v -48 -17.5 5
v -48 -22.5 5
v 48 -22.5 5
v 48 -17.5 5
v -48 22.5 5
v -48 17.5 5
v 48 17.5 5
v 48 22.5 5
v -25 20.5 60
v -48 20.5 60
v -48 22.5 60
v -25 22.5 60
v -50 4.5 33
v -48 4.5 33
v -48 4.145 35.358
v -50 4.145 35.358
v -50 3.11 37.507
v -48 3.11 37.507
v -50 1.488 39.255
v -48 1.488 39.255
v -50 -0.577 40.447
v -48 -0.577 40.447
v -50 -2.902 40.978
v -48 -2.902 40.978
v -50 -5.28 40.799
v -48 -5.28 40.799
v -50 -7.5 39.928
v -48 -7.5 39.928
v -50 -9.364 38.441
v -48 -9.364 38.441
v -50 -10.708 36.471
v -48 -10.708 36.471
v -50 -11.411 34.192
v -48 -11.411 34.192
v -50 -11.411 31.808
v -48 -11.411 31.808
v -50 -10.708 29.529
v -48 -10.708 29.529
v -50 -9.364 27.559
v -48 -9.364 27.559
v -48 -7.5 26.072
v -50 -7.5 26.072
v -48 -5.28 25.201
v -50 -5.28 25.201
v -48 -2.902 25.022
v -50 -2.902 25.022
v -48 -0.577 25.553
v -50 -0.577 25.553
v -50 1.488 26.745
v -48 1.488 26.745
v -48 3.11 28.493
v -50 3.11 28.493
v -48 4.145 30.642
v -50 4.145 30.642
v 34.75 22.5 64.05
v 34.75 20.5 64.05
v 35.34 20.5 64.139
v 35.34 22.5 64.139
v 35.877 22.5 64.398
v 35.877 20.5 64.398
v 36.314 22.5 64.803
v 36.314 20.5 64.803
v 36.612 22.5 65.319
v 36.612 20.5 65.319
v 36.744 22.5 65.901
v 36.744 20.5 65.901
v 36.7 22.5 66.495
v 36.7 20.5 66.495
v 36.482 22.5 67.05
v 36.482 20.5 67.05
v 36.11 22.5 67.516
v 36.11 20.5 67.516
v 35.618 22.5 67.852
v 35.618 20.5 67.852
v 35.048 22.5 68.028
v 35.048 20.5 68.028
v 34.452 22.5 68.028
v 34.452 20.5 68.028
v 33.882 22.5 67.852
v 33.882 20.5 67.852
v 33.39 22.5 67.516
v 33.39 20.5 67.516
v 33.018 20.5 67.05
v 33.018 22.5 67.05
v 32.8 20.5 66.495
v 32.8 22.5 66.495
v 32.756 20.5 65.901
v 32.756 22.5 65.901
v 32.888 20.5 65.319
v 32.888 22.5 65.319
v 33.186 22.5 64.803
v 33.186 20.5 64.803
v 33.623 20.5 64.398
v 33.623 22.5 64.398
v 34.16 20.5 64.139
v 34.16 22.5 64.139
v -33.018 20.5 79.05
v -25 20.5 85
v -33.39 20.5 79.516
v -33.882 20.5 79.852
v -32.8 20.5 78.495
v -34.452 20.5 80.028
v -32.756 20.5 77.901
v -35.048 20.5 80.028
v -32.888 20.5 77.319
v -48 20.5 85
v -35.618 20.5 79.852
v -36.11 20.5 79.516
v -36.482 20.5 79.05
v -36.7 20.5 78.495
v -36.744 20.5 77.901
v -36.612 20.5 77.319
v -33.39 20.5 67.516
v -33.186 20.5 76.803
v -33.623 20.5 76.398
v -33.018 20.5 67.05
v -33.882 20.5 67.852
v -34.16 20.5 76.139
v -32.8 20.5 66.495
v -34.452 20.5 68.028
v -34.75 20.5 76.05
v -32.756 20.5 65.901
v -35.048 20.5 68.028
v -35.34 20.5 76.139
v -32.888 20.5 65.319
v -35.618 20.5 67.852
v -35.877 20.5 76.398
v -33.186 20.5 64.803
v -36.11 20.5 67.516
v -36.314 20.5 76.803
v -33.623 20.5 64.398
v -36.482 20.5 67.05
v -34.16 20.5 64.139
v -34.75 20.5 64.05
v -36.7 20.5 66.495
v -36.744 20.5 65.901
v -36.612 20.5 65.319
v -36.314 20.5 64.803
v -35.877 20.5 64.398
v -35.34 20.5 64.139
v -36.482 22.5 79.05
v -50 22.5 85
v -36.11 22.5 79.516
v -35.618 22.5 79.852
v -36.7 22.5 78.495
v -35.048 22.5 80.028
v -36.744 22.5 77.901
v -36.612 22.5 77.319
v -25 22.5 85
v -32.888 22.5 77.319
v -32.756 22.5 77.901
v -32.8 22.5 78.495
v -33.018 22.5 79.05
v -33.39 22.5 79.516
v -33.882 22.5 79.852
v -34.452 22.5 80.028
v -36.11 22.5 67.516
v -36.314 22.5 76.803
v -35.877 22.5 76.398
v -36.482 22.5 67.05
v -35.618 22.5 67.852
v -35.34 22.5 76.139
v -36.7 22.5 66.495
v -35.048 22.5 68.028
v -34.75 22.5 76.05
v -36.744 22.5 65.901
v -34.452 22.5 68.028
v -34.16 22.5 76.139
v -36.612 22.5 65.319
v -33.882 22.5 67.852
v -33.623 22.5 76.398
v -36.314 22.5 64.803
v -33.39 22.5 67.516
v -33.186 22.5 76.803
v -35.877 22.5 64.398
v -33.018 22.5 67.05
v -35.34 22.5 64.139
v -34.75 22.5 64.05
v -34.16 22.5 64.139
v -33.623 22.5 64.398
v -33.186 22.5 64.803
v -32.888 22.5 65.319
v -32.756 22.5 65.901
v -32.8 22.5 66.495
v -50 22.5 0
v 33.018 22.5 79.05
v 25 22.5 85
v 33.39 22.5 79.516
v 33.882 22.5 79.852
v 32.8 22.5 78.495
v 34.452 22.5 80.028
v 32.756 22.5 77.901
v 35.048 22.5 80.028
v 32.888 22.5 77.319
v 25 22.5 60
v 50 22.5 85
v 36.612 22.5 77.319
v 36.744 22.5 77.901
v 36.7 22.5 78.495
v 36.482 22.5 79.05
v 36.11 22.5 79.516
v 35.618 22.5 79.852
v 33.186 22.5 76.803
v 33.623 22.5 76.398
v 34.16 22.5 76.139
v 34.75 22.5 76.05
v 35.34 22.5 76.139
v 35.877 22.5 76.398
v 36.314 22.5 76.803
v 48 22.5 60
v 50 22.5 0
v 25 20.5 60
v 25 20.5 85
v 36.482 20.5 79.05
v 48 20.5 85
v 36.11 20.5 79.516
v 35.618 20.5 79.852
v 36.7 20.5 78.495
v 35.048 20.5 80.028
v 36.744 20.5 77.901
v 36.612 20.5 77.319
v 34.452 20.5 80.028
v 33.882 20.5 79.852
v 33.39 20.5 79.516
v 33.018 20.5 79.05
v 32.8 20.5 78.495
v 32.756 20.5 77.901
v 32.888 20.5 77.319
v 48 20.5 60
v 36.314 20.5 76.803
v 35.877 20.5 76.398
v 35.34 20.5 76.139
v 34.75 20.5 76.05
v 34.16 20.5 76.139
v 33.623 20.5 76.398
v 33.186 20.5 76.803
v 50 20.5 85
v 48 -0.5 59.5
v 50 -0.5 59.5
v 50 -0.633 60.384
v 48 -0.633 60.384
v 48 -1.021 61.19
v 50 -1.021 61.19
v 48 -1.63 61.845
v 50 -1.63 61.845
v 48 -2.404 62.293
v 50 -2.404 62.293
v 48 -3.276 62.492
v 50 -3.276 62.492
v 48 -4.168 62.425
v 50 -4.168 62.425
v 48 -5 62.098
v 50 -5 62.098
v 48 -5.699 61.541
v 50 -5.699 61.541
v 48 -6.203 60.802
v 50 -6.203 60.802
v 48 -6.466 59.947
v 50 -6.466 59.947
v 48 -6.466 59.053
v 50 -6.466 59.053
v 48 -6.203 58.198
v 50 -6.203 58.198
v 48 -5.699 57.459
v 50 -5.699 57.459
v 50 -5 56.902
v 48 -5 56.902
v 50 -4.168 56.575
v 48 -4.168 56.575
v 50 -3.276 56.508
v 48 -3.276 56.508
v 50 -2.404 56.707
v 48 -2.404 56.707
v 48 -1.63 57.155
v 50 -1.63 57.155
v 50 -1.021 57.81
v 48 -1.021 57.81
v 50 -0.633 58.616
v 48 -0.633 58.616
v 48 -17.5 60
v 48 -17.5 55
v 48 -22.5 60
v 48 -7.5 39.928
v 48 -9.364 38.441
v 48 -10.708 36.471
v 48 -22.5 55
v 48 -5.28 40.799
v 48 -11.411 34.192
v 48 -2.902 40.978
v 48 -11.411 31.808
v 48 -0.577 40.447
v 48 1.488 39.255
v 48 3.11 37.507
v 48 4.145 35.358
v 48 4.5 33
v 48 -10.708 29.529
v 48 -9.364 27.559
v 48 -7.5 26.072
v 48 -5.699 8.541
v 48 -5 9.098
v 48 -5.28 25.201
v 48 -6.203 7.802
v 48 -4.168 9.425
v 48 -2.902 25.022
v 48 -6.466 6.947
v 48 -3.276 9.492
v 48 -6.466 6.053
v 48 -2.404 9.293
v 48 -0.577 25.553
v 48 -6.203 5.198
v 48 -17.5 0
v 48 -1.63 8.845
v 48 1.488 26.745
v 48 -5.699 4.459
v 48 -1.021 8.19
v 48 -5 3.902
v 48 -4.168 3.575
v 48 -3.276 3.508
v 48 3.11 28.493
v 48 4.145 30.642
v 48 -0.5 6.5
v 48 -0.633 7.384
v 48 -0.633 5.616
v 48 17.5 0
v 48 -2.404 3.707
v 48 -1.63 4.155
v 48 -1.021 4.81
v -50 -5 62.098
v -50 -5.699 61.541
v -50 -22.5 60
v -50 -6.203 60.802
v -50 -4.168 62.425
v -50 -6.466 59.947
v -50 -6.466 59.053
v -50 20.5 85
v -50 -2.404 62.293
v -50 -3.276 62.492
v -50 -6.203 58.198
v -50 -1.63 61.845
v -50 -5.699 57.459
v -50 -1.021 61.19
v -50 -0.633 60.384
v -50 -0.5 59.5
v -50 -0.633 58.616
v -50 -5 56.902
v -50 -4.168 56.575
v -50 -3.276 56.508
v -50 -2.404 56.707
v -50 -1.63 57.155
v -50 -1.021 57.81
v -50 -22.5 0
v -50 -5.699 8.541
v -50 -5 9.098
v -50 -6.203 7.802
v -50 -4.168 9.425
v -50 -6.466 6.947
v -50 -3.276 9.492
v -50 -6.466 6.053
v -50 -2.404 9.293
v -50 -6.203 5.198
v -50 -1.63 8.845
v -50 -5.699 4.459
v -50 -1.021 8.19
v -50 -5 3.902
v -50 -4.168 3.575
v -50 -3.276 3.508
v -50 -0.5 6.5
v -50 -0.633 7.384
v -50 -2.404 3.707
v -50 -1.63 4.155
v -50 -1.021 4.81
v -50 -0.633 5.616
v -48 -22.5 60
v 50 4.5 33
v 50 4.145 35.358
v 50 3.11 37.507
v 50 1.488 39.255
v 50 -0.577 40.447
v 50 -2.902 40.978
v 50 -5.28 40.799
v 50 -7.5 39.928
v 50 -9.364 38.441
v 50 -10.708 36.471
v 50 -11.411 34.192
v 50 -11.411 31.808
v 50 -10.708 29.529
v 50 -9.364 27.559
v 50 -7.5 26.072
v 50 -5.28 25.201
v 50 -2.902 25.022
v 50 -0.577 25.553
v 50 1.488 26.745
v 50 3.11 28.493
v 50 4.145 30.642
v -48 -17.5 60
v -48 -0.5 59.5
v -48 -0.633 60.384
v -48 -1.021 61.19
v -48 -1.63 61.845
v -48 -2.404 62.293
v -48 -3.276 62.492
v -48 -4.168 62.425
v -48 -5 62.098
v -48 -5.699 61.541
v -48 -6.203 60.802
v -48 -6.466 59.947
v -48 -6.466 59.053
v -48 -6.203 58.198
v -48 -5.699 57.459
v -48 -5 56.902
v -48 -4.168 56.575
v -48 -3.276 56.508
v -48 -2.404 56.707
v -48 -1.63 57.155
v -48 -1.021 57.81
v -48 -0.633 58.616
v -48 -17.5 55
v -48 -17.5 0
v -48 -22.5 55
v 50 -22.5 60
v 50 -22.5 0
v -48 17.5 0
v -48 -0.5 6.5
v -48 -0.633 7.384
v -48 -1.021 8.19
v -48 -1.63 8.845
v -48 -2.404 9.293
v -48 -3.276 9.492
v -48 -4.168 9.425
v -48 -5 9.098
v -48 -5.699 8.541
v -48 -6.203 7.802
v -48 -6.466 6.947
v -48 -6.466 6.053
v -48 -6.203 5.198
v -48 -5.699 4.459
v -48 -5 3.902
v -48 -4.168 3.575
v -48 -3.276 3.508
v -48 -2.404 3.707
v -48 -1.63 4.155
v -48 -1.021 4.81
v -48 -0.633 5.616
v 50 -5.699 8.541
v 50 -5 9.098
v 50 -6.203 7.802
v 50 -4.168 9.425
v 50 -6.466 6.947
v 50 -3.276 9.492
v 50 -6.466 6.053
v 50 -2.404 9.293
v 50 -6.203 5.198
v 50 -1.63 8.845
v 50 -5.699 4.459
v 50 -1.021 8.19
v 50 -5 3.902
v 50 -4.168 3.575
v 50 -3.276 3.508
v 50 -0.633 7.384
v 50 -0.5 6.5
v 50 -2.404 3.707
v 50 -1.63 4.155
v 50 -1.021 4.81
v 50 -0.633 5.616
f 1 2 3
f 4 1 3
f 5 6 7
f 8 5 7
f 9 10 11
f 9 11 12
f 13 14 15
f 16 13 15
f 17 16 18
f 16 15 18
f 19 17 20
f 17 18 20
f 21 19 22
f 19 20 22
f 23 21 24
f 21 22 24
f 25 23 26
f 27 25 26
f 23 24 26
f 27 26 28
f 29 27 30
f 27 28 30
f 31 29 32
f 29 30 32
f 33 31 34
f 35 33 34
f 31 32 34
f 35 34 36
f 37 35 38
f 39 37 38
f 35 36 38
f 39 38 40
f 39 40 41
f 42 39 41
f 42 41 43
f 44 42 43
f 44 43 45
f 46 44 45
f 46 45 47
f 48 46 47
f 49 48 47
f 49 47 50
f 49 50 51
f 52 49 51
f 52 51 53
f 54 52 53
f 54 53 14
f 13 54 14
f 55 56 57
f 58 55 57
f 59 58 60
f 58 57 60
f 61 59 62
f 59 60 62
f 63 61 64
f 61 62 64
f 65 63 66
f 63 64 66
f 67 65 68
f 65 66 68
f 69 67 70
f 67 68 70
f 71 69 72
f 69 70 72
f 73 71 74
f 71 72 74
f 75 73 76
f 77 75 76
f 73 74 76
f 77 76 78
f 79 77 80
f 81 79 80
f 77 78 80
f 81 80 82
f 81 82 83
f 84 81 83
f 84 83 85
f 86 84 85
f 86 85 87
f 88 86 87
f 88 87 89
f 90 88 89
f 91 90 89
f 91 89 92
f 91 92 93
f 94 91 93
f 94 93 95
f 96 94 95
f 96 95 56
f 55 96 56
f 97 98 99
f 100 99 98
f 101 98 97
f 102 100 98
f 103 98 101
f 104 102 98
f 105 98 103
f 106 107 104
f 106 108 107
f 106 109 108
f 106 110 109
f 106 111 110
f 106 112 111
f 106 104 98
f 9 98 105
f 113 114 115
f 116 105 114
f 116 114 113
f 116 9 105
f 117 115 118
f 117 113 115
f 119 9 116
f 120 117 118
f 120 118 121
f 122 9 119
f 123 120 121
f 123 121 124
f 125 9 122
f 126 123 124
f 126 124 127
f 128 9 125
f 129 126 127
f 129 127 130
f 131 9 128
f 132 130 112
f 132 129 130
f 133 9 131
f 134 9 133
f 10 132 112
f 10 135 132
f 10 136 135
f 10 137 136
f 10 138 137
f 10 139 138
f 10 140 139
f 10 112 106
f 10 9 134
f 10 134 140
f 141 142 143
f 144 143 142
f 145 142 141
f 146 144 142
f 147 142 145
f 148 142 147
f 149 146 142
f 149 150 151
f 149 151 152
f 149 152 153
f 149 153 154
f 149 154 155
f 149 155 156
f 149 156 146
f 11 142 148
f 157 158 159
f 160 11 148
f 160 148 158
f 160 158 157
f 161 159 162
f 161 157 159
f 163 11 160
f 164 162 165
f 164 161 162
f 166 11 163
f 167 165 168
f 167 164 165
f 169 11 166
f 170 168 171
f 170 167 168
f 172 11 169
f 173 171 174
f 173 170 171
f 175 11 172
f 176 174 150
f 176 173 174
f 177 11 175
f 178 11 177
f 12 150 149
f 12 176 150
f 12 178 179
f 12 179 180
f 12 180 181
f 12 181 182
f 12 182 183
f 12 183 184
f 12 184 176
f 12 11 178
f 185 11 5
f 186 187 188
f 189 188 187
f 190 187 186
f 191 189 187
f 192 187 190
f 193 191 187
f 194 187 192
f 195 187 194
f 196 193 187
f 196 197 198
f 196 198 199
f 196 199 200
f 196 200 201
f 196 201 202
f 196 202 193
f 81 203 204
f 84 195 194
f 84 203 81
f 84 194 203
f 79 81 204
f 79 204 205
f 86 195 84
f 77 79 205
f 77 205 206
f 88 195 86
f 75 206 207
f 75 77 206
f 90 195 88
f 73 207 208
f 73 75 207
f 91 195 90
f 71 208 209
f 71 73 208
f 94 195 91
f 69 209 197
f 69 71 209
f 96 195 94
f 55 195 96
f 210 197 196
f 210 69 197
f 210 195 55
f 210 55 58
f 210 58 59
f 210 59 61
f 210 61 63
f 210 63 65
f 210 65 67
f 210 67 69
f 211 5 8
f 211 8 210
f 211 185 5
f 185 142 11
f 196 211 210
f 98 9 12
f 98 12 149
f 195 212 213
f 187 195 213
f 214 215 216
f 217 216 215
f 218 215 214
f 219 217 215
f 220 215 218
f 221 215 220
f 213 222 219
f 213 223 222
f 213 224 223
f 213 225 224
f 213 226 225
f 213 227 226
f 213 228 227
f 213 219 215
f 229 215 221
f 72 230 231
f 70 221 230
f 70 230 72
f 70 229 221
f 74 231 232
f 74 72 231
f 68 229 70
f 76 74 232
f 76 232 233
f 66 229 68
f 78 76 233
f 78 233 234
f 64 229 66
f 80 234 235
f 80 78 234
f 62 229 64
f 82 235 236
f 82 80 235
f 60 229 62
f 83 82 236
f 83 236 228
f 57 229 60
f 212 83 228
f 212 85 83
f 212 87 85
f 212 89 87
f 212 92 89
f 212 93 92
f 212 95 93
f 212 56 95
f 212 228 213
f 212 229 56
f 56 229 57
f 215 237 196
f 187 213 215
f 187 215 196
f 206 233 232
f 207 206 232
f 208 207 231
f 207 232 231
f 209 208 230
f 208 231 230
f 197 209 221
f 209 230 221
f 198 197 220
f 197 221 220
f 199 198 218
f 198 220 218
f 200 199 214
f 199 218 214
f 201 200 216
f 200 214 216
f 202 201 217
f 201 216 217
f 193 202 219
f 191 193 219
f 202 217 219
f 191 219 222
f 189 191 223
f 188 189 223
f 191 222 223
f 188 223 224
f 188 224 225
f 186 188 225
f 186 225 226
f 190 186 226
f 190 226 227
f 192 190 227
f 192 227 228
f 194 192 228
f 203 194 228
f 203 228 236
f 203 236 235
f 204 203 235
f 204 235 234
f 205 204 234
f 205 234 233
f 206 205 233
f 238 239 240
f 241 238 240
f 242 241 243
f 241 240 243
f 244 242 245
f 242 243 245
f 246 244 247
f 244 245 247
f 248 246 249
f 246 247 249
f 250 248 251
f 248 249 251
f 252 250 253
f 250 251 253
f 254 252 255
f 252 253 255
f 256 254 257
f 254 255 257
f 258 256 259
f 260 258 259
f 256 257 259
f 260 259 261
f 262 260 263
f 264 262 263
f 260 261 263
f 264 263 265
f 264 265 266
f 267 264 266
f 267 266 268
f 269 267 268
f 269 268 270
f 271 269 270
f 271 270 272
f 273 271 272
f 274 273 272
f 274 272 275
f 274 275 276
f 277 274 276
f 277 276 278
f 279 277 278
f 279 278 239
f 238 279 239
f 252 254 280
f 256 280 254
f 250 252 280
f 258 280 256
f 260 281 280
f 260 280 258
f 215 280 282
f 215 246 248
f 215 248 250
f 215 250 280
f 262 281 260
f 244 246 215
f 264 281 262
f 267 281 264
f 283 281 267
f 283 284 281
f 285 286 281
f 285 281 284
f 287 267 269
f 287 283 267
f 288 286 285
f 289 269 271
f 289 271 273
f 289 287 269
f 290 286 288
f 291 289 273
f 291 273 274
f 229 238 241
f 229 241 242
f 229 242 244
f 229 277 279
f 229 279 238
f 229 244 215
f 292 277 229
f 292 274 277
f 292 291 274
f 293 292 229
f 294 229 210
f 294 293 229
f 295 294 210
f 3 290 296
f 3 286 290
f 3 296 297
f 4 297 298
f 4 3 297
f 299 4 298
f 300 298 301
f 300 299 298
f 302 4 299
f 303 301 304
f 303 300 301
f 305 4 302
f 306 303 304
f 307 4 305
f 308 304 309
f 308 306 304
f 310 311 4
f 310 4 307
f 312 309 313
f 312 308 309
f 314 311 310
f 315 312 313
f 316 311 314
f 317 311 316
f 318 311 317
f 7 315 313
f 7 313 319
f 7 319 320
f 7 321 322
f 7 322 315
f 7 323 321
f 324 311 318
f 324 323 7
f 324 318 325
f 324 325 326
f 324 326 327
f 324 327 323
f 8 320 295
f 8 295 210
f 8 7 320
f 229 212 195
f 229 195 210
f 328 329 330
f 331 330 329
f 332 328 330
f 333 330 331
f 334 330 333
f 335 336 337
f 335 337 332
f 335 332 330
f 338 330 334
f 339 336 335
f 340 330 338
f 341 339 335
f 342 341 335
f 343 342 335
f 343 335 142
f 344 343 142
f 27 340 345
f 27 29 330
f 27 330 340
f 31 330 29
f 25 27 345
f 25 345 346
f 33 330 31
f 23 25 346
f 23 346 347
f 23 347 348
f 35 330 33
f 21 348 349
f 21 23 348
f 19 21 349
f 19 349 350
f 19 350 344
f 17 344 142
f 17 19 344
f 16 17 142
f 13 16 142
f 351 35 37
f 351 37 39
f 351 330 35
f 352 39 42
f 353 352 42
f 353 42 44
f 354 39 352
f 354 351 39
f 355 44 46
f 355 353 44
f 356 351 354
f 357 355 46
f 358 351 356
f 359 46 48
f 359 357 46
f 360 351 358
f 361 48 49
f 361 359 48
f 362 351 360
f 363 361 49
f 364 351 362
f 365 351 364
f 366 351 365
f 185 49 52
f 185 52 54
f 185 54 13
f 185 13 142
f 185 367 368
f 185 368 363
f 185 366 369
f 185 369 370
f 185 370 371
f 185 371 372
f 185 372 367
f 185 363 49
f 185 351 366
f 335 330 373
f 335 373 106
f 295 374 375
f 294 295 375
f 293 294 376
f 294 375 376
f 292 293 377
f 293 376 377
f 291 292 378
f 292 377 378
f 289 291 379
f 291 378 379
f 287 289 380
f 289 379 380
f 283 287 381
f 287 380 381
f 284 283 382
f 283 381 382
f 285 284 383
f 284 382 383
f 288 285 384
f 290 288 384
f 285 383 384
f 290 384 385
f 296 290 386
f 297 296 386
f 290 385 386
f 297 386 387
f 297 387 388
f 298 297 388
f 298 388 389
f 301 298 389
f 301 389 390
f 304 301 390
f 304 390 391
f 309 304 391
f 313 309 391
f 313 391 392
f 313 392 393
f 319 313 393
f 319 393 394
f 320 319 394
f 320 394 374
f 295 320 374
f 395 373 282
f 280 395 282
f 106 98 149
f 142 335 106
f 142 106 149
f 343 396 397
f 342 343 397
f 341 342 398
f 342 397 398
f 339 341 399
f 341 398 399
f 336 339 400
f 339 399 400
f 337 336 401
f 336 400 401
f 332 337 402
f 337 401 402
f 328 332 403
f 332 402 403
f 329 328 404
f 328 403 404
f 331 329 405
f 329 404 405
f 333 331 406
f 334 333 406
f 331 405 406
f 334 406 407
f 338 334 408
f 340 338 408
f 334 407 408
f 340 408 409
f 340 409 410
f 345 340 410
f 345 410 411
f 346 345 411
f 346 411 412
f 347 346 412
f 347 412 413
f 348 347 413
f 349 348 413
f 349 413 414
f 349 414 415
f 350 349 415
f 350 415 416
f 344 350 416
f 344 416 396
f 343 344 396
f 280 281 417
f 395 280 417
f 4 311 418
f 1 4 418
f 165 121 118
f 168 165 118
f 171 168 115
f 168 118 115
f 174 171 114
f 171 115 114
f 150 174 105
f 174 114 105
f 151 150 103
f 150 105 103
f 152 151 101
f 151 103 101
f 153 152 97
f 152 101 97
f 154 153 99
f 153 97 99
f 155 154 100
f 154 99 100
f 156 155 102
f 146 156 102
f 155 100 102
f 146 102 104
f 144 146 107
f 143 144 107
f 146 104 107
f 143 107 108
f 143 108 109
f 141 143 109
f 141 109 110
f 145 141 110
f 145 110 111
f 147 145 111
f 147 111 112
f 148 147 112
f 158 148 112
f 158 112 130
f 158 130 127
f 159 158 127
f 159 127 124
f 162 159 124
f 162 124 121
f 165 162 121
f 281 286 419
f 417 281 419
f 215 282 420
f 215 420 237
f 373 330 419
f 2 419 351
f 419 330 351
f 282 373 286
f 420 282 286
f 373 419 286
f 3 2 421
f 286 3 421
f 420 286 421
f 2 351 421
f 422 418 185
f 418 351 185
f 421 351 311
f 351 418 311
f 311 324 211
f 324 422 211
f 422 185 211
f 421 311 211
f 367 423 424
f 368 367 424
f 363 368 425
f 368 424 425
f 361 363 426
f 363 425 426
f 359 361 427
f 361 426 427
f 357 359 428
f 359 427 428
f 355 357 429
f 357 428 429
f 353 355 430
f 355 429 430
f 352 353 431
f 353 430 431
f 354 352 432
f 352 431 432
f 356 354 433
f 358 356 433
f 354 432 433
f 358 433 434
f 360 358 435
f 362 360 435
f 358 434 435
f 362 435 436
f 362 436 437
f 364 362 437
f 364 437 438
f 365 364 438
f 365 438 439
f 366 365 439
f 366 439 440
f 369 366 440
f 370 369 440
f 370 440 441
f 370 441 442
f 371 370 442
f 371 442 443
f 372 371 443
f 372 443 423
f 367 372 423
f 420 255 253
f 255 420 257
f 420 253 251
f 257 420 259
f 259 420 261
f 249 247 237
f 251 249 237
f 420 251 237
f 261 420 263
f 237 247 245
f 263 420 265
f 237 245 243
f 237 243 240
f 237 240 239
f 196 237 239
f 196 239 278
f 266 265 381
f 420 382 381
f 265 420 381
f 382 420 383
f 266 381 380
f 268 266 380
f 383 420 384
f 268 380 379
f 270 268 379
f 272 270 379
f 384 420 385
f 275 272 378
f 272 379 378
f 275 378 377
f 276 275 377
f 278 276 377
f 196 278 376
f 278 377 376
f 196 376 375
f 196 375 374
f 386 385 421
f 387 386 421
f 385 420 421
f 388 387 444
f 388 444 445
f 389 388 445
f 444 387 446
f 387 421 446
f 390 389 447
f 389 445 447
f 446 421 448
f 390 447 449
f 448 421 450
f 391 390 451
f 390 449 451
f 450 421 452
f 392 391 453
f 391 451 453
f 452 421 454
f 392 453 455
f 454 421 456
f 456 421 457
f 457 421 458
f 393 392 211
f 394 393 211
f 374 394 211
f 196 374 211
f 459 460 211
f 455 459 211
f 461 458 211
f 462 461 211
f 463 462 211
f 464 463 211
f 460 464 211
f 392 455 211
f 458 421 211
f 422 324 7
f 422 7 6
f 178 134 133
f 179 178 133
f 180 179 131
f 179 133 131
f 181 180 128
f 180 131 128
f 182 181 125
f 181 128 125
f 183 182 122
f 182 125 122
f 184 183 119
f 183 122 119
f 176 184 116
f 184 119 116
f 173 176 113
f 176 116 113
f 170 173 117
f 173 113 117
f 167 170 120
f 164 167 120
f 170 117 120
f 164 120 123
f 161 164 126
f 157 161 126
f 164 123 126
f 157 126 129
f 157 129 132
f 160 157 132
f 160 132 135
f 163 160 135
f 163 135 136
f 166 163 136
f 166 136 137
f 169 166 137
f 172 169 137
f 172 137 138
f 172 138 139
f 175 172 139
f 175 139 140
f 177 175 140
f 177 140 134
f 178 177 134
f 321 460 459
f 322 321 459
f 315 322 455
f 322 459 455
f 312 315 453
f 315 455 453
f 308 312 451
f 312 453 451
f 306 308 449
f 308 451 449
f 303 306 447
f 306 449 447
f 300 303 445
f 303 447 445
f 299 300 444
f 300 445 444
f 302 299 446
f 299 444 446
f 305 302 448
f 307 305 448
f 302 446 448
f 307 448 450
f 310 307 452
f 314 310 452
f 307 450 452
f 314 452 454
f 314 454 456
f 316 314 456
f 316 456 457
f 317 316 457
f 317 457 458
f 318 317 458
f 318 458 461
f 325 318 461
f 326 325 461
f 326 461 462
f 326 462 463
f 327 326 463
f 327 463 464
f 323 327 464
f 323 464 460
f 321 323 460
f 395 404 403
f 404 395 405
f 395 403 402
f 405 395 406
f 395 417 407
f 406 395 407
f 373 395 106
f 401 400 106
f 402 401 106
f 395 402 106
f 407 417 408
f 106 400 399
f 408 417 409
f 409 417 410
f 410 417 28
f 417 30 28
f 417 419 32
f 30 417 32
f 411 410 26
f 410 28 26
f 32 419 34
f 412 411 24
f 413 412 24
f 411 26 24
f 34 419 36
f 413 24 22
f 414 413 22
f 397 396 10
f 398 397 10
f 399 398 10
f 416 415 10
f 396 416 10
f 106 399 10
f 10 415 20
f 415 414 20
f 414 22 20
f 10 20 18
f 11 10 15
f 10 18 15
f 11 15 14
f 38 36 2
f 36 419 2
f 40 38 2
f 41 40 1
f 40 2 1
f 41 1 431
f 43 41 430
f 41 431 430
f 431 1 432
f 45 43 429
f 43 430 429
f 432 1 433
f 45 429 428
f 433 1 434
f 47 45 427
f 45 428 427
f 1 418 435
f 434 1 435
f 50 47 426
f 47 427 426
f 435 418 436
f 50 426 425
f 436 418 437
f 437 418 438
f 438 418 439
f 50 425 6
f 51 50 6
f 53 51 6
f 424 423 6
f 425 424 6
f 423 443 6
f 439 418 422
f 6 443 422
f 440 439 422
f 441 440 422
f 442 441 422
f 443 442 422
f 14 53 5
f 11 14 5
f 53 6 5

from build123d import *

# Parameters (mm, degrees)
SKETCH1_W               = 100
SKETCH1_H               = 45
BOSS_EXTRUDE1_DEPTH     = 90
CUT_EXTRUDE1_DEPTH      = 137.404728657
CUT_EXTRUDE2_DEPTH      = 109.397416943
CUT_EXTRUDE2_DEPTH_BACK = 109.397416943
SKETCH3_W               = 96
SKETCH3_H               = 32.638698082
SKETCH4_W               = 96
SKETCH4_H               = 35
CUT_EXTRUDE4_DEPTH      = 102.149641621
SKETCH5_R               = 8
SKETCH5_R_2             = 3
CUT_EXTRUDE5_DEPTH      = 134.158739856
SKETCH7_W               = 96
SKETCH7_H               = 3
CUT_EXTRUDE7_DEPTH      = 73.452349302
SKETCH9_W               = 50
SKETCH9_H               = 59.094844588
CUT_EXTRUDE9_DEPTH      = 34
SKETCH10_R              = 2
CUT_EXTRUDE10_DEPTH     = 34
CUT_EXTRUDE11_DEPTH     = 109.397416943
SKETCH11_W              = 96
SKETCH11_H              = 6.475085822
CUT_EXTRUDE12_DEPTH     = 34
SKETCH12_W              = 23
SKETCH12_H              = 26.924334535
CUT_EXTRUDE13_DEPTH     = 34


with BuildPart() as part:
    # Sketch1 → Boss-Extrude1 (new body)
    with BuildSketch(Plane.XY):
        Rectangle(SKETCH1_W, SKETCH1_H)
    extrude(amount=BOSS_EXTRUDE1_DEPTH)

    # Sketch2 → Cut-Extrude1 (cut, through all)
    with BuildSketch(Plane.ZY.offset(50)):
        Polygon((60, -22.5), (85, 20.5), (85, 22.5), (90, 22.5), (90, -22.5), align=None)
    extrude(amount=-CUT_EXTRUDE1_DEPTH, mode=Mode.SUBTRACT)

    # Sketch3 → Cut-Extrude2 (cut, two sides: drawn at the far end of the back side and taken through both)
    with BuildSketch(Plane(origin=(0, 22.5, 0), x_dir=(1, 0, 0), z_dir=(0, 1, 0)).offset(-CUT_EXTRUDE2_DEPTH_BACK)):
        with Locations((0, -21.319349041)):
            Rectangle(SKETCH3_W, SKETCH3_H)
    extrude(amount=CUT_EXTRUDE2_DEPTH + CUT_EXTRUDE2_DEPTH_BACK, mode=Mode.SUBTRACT)

    # Sketch4 → Cut-Extrude4 (cut, through all)
    with BuildSketch(Plane(origin=(0, 0, 0), x_dir=(-1, 0, 0), z_dir=(0, 0, -1))):
        Rectangle(SKETCH4_W, SKETCH4_H)
    extrude(amount=-CUT_EXTRUDE4_DEPTH, mode=Mode.SUBTRACT)

    # Sketch5 → Cut-Extrude5 (cut, through all)
    with BuildSketch(Plane(origin=(50, 0, 0), x_dir=(0, 0, -1), z_dir=(1, 0, 0))):
        with Locations(Location((-33, -3.5, 0), (0, 0, 90))):
            Circle(SKETCH5_R)
        with Locations(Location((-6.5, -3.5, 0), (0, 0, 90))):
            Circle(SKETCH5_R_2)
        with Locations(Location((-59.5, -3.5, 0), (0, 0, 90))):
            Circle(SKETCH5_R_2)
    extrude(amount=-CUT_EXTRUDE5_DEPTH, mode=Mode.SUBTRACT)

    # Sketch7 → Cut-Extrude7 (cut, through all)
    with BuildSketch(Plane(origin=(0, 0, 37.638698082), x_dir=(-1, 0, 0), z_dir=(0, 0, -1))):
        with Locations((0, 19)):
            Rectangle(SKETCH7_W, SKETCH7_H)
    extrude(amount=-CUT_EXTRUDE7_DEPTH, mode=Mode.SUBTRACT)

    # Sketch9 → Cut-Extrude9 (cut)
    with BuildSketch(Plane.XZ.offset(-20.5)):
        with Locations((0, 59.291541431)):
            Rectangle(SKETCH9_W, SKETCH9_H)
    extrude(amount=-CUT_EXTRUDE9_DEPTH, mode=Mode.SUBTRACT)

    # Sketch10 → Cut-Extrude10 (cut)
    with BuildSketch(Plane.XZ.offset(-20.5)):
        with Locations(Location((34.75, 78.05, 0), (0, 0, 270))):
            Circle(SKETCH10_R)
        with Locations(Location((34.75, 66.05, 0), (0, 0, 270))):
            Circle(SKETCH10_R)
        with Locations(Location((-34.75, 66.05, 0), (0, 0, 270))):
            Circle(SKETCH10_R)
        with Locations(Location((-34.75, 78.05, 0), (0, 0, 270))):
            Circle(SKETCH10_R)
    extrude(amount=-CUT_EXTRUDE10_DEPTH, mode=Mode.SUBTRACT)

    # Sketch8 → Cut-Extrude11 (cut, through all)
    with BuildSketch(Plane.XZ.offset(22.5)):
        Polygon((-48, 51.874077108), (-48, 37.638698082), (48, 37.638698082), (48, 51.874077108), (48, 55), (-48, 55), align=None)
    extrude(amount=-CUT_EXTRUDE11_DEPTH, mode=Mode.SUBTRACT)

    # Sketch11 → Cut-Extrude12 (cut)
    with BuildSketch(Plane.XZ.offset(22.5)):
        with Locations((0, 63.237542911)):
            Rectangle(SKETCH11_W, SKETCH11_H)
    extrude(amount=-CUT_EXTRUDE12_DEPTH, mode=Mode.SUBTRACT)

    # Sketch12 → Cut-Extrude13 (cut)
    with BuildSketch(Plane.XZ.offset(-20.5)):
        with Locations((-36.5, 46.537832733)):
            Rectangle(SKETCH12_W, SKETCH12_H)
        with Locations((36.5, 46.537832733)):
            Rectangle(SKETCH12_W, SKETCH12_H)
    extrude(amount=-CUT_EXTRUDE13_DEPTH, mode=Mode.SUBTRACT)


solid = part.part
